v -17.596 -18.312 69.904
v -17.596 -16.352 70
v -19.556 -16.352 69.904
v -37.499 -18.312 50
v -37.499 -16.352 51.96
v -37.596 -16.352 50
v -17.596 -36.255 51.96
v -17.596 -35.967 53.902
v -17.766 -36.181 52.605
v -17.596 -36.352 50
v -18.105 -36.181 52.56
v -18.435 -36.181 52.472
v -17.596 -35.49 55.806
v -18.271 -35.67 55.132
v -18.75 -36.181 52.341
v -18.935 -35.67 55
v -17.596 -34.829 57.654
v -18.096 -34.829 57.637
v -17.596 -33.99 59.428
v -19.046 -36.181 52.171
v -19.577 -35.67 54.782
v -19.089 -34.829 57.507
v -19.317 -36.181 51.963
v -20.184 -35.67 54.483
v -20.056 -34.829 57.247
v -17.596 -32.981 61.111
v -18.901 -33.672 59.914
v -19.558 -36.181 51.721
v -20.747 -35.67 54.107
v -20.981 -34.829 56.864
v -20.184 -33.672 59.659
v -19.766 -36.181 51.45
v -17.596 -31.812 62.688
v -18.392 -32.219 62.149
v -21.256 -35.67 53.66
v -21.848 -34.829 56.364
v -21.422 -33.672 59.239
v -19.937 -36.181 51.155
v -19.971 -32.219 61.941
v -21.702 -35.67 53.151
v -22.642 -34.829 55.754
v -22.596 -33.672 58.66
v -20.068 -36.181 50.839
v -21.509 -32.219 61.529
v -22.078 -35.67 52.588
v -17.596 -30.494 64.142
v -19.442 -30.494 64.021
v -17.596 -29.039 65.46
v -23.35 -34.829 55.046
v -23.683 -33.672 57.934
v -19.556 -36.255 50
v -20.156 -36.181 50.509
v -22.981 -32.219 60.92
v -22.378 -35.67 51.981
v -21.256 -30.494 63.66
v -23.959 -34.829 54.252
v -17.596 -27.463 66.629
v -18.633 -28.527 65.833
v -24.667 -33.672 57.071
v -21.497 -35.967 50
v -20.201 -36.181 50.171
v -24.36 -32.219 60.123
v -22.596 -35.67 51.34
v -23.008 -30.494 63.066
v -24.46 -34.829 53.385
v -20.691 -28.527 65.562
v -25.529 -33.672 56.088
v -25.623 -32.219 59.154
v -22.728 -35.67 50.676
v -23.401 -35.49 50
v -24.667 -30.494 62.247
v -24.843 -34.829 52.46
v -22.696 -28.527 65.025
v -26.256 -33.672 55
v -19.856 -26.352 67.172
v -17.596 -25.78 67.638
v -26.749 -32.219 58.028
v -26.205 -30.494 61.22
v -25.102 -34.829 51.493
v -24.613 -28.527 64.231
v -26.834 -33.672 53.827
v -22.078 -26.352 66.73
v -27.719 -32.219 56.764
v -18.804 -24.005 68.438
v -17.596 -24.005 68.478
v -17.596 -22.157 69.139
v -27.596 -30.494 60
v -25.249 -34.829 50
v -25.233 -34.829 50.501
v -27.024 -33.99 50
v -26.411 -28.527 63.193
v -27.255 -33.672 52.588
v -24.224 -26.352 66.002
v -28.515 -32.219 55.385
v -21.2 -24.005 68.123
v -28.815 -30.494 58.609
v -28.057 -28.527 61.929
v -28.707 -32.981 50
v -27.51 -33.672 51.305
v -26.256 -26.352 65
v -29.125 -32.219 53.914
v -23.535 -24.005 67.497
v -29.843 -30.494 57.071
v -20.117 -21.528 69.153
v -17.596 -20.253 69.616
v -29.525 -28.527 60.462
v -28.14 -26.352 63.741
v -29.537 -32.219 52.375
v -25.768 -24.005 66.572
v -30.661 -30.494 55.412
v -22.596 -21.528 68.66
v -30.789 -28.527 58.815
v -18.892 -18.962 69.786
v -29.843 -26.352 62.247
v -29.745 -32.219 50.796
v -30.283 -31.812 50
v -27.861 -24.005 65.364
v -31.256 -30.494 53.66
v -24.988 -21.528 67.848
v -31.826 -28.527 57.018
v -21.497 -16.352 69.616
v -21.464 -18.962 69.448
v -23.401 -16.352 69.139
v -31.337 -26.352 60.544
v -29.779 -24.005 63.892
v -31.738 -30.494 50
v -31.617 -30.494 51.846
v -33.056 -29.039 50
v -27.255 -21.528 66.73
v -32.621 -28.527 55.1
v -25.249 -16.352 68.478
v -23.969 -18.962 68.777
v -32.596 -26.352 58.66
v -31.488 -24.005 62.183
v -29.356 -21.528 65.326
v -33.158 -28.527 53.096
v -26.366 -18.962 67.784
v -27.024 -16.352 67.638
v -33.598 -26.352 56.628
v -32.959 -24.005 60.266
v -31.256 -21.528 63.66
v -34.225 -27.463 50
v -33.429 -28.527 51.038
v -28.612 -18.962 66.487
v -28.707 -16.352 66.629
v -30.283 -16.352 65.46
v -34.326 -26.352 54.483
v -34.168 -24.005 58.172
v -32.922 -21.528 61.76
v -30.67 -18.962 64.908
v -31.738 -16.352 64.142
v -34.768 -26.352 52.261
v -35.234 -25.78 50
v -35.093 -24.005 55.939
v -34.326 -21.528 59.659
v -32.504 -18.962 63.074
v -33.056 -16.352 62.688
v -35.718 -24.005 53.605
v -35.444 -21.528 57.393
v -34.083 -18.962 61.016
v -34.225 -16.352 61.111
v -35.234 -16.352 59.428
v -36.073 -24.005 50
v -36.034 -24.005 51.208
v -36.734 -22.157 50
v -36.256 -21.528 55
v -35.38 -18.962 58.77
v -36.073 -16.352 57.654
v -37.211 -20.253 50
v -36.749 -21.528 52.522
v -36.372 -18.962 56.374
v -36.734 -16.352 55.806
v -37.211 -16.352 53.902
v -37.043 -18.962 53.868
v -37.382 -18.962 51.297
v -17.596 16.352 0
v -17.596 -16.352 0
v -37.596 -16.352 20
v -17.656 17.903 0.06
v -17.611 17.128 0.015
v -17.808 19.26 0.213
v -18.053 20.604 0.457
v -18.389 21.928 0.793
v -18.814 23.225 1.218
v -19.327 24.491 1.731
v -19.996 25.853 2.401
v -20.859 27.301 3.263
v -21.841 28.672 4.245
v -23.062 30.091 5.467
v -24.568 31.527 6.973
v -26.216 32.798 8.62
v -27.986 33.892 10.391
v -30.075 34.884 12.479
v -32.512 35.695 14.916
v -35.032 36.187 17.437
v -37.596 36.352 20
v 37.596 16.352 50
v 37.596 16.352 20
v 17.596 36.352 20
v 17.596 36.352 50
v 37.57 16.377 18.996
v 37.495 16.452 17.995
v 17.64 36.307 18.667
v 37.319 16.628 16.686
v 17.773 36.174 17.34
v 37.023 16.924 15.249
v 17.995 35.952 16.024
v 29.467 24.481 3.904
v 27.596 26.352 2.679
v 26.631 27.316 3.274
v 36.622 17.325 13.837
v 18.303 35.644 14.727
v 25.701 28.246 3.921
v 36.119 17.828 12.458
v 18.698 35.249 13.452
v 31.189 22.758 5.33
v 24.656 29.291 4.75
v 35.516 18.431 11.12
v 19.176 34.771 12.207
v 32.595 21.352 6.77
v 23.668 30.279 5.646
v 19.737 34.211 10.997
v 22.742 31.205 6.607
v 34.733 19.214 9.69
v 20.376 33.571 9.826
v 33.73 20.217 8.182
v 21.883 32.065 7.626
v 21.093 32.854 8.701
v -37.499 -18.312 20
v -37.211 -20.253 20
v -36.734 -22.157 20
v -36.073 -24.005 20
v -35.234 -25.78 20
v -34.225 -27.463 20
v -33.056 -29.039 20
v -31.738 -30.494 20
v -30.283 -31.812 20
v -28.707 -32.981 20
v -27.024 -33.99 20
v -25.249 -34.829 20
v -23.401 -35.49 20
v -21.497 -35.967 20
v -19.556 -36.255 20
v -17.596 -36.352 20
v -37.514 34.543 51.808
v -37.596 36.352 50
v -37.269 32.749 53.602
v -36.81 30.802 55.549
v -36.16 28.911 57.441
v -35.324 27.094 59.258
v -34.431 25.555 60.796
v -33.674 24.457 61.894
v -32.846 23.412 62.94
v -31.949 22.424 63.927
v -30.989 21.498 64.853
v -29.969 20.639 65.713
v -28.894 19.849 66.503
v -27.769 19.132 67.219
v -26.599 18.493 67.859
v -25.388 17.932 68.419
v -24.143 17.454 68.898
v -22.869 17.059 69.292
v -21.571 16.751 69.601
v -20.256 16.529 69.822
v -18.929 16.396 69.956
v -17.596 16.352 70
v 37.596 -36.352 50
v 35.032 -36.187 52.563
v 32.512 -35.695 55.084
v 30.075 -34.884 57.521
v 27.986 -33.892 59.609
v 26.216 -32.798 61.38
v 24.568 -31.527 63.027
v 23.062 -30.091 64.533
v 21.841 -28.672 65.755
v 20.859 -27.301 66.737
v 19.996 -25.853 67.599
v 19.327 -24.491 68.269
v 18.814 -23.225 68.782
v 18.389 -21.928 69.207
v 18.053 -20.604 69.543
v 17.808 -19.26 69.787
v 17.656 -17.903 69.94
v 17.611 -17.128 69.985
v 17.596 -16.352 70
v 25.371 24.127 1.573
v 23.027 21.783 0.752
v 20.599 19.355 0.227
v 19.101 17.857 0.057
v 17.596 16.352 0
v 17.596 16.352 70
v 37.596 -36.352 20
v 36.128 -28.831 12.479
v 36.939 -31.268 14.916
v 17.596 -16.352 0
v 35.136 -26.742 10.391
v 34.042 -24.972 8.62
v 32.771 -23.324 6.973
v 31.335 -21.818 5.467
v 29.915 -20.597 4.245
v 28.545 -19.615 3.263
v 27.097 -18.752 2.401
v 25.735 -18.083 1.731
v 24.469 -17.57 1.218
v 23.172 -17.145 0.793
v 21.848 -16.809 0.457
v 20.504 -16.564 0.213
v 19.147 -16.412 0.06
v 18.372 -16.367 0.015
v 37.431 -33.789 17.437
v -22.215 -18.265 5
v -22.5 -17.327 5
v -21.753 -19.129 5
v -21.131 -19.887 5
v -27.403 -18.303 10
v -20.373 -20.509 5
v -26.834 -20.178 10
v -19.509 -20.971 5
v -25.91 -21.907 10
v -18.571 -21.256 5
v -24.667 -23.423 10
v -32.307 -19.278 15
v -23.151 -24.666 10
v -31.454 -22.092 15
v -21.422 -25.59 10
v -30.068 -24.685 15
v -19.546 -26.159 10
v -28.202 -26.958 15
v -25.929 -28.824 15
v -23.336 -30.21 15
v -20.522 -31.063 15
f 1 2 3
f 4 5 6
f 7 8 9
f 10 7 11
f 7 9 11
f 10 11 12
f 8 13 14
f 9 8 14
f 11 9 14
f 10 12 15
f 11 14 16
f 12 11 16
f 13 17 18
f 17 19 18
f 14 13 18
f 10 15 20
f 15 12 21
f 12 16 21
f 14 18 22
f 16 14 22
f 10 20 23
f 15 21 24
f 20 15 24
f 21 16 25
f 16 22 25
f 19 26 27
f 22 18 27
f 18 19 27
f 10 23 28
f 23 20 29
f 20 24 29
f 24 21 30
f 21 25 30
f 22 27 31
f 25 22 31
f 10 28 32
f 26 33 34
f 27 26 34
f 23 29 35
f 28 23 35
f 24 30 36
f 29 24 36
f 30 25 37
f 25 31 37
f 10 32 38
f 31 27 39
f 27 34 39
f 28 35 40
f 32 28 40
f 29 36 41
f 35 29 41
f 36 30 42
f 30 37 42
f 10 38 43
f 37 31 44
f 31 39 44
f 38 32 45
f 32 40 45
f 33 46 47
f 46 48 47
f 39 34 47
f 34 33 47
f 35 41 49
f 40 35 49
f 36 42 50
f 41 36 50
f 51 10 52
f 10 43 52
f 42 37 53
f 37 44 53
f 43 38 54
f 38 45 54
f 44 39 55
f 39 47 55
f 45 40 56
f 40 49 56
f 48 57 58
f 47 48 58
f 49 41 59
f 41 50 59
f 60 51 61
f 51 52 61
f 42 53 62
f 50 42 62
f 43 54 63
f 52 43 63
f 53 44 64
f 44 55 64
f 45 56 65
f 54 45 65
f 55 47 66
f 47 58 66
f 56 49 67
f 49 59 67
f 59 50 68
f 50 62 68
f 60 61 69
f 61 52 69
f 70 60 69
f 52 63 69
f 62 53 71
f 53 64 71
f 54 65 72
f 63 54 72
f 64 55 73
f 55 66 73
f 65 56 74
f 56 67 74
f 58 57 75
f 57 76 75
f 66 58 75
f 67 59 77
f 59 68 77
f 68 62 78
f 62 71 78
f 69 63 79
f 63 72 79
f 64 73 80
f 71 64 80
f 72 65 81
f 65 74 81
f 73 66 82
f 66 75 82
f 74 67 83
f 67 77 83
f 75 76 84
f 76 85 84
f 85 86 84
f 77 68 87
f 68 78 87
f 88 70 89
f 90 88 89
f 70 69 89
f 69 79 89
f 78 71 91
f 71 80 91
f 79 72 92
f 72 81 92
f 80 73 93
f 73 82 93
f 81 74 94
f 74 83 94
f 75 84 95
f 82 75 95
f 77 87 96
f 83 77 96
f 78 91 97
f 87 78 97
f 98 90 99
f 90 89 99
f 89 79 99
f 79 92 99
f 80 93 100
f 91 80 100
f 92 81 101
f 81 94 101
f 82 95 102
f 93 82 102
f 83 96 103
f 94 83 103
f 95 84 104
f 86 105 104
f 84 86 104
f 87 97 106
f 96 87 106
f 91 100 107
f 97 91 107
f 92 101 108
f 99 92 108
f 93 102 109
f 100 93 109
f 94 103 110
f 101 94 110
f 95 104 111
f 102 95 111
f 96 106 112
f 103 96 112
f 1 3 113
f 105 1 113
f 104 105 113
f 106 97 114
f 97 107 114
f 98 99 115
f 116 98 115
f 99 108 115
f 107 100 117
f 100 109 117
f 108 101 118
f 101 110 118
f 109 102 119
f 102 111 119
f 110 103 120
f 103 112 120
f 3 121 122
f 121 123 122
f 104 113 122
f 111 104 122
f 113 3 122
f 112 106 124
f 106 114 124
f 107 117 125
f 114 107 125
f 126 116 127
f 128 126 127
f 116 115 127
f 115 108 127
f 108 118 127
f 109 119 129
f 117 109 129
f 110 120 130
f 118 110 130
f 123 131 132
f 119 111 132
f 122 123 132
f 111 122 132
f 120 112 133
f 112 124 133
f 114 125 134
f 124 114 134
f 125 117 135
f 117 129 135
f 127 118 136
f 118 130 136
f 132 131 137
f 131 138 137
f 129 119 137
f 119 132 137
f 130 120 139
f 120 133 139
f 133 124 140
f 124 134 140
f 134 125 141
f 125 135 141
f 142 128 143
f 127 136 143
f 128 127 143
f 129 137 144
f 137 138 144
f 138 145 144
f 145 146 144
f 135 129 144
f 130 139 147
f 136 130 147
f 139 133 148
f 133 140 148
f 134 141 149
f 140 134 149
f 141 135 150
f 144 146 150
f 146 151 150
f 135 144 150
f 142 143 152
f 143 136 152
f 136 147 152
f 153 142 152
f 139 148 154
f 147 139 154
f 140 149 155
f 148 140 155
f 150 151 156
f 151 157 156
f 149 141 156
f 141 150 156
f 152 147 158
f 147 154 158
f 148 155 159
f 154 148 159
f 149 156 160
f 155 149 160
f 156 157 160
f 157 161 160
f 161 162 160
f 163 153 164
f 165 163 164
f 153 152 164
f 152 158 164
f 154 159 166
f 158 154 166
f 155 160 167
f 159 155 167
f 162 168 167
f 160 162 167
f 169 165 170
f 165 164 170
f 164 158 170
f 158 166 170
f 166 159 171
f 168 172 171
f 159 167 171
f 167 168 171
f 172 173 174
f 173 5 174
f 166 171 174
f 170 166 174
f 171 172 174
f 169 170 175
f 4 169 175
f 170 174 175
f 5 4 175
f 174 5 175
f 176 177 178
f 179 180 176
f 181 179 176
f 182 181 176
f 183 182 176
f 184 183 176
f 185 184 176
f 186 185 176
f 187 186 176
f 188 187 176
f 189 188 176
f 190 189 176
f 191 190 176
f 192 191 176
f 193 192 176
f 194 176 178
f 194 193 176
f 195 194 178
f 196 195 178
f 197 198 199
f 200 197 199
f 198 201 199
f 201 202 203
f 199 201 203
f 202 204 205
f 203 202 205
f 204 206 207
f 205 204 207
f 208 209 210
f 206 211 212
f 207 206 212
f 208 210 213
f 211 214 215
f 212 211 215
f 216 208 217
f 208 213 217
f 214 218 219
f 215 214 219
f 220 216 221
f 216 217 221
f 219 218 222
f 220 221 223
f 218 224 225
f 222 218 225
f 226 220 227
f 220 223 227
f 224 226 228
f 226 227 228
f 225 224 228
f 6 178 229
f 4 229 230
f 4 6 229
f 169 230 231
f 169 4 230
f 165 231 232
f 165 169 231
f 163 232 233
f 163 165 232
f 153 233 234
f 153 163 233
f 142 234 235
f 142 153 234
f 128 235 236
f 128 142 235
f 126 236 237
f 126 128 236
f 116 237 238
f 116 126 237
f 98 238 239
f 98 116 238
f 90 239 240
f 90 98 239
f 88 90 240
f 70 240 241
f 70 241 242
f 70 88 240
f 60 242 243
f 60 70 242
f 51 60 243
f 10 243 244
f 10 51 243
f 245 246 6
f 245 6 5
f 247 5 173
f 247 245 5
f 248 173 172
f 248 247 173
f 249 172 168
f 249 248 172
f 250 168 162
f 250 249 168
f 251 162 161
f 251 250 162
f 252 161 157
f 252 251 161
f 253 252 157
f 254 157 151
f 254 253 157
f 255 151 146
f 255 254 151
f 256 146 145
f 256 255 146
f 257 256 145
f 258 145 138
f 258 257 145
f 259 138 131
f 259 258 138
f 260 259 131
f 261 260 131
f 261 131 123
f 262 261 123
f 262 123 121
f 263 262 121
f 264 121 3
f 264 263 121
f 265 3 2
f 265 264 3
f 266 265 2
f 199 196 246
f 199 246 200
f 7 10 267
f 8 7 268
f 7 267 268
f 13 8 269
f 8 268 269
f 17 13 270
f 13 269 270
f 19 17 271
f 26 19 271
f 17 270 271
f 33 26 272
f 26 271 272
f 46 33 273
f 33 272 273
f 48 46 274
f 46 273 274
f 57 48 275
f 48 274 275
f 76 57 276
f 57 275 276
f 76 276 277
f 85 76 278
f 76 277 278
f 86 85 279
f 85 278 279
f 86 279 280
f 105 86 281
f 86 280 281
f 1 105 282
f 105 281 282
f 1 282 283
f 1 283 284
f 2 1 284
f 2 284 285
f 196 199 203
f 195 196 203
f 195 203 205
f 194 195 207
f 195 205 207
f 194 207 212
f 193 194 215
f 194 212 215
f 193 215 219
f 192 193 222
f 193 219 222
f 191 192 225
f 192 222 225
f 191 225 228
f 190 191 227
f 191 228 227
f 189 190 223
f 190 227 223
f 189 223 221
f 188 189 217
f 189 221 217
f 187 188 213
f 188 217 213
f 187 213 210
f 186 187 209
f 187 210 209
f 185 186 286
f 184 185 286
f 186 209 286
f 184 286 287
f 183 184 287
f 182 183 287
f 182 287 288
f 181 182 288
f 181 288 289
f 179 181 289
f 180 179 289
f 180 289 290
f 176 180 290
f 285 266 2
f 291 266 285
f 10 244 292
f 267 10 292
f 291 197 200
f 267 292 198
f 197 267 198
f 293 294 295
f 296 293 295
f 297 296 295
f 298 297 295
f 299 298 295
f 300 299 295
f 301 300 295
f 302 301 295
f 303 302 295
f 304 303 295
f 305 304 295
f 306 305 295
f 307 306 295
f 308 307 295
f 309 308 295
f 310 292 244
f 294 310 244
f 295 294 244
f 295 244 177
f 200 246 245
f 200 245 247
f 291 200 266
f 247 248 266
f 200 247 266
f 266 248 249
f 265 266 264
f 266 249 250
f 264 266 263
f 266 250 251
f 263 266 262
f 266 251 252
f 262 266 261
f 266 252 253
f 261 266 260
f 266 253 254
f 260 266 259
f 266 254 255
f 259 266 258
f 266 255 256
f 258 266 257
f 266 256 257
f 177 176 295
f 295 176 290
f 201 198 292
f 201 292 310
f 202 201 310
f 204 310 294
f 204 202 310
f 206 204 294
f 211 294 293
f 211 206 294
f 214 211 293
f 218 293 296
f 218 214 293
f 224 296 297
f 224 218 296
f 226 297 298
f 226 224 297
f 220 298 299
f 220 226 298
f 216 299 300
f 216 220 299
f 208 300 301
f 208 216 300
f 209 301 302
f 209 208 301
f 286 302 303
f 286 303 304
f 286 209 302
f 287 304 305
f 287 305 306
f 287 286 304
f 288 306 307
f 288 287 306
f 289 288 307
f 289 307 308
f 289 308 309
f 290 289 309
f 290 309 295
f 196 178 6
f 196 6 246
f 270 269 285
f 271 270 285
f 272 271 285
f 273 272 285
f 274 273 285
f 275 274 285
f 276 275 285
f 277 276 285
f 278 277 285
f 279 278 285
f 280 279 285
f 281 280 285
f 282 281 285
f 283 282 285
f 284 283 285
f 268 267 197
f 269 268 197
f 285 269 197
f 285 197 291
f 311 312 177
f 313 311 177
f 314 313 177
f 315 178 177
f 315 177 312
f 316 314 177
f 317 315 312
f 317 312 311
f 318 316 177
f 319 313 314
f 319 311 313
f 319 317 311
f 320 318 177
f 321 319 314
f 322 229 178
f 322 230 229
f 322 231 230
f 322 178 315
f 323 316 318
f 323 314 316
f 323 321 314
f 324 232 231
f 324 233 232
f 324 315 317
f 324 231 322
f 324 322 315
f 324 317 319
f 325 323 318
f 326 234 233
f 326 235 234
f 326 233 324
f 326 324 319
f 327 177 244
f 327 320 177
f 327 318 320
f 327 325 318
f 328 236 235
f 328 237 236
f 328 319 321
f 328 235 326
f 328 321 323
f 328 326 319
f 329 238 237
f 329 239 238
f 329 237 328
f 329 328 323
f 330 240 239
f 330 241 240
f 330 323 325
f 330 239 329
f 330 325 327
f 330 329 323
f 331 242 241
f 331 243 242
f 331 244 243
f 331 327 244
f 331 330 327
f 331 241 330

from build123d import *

# Parameters (mm, degrees)
F0_W         = 75.1911774278
F0_H         = 72.7032572031
F1_DEPTH     = 70
F2_R         = 20
F3_T1_DEPTH  = 25.4034118443
F3_T3_DEPTH  = 155.5705767217
F3_T5_DEPTH  = 158.0584969464
F3_T7_DEPTH  = 152.8673195186
F3_T9_DEPTH  = 86.6248371871
F3_T11_DEPTH = 84.1369169624
F3_T14_ANGLE = 90


# Not quite as in the source:
# - a fillet or chamfer that OpenCascade refuses, or shapes differently, is made with other operations: its cross-section is extruded or revolved along the edge and cut away or added


with BuildPart() as f1:
    # F0 (on Top) → F1 (new body)
    with BuildSketch(Plane.XY):
        Rectangle(F0_W, F0_H)
    extrude(amount=F1_DEPTH)

    # F2
    f2_edges = [f1.edges().sort_by_distance(p)[0] for p in [
        (-37.595589, 0, 70),
        (0, -36.351629, 70),
        (-37.595589, -36.351629, 35),
        (0, 36.351629, 0),
        (37.595589, 0, 0),
    ]]
    fillet(f2_edges, radius=F2_R)

    # F3: chamfer of 20 on 6 edges, made by hand

    # F3_s2 → F3_t1 (cut)
    with BuildSketch(Plane(origin=(34.6490724385, 34.6490724385, 34.6490724385), x_dir=(-0.7071067812, 0.7071067812, 0), z_dir=(0.5773502692, 0.5773502692, 0.5773502692))):
        Polygon((-15.0217482547, 18.8009698021), (13.2625229928, 18.8009698021), (-0.879612631, 43.2958672299), align=None)
    extrude(amount=F3_T1_DEPTH, mode=Mode.SUBTRACT)

    # F3_s4 → F3_t3 (cut)
    with BuildSketch(Plane.XZ.offset(-87.7852883609)):
        Polygon((37.5955887139, 50), (17.5955887139, 70), (37.5955887139, 70), align=None)
    extrude(amount=F3_T3_DEPTH, mode=Mode.SUBTRACT)

    # F3_s6 → F3_t5 (cut)
    with BuildSketch(Plane.YZ.offset(-69.0292484732)):
        Polygon((36.3516286016, 50), (16.3516286016, 70), (36.3516286016, 70), align=None)
    extrude(amount=F3_T5_DEPTH, mode=Mode.SUBTRACT)

    # F3_s8 → F3_t7 (cut)
    with BuildSketch(Plane.XY.offset(-31.4336597593)):
        Polygon((37.5955887139, 16.3516286016), (17.5955887139, 36.3516286016), (37.5955887139, 36.3516286016), align=None)
    extrude(amount=F3_T7_DEPTH, mode=Mode.SUBTRACT)

    # F3_s10 → F3_t9 (cut)
    with BuildSketch(Plane.YZ.offset(-17.5955887139)):
        Polygon((-36.3516286016, 20), (-16.3516286016, 0), (-36.3516286016, 0), align=None)
    extrude(amount=F3_T9_DEPTH, mode=Mode.SUBTRACT)

    # F3_s12 → F3_t11 (cut)
    with BuildSketch(Plane.XZ.offset(-67.7852883609)):
        Polygon((-17.5955887139, 0), (-37.5955887139, 20), (-37.5955887139, 0), align=None)
    extrude(amount=F3_T11_DEPTH, mode=Mode.SUBTRACT)

    # F3_s13 → F3_t14 (revolve, cut)
    with BuildSketch(Plane.XZ.offset(16.3516286016)):
        Polygon((-17.5955887139, 0), (-37.5955887139, 20), (-37.5955887139, 0), align=None)
    revolve(axis=Axis((-17.5955887139, -16.3516286016, 0), (0, 0, 1)), revolution_arc=F3_T14_ANGLE, mode=Mode.SUBTRACT)


solid = f1.part
